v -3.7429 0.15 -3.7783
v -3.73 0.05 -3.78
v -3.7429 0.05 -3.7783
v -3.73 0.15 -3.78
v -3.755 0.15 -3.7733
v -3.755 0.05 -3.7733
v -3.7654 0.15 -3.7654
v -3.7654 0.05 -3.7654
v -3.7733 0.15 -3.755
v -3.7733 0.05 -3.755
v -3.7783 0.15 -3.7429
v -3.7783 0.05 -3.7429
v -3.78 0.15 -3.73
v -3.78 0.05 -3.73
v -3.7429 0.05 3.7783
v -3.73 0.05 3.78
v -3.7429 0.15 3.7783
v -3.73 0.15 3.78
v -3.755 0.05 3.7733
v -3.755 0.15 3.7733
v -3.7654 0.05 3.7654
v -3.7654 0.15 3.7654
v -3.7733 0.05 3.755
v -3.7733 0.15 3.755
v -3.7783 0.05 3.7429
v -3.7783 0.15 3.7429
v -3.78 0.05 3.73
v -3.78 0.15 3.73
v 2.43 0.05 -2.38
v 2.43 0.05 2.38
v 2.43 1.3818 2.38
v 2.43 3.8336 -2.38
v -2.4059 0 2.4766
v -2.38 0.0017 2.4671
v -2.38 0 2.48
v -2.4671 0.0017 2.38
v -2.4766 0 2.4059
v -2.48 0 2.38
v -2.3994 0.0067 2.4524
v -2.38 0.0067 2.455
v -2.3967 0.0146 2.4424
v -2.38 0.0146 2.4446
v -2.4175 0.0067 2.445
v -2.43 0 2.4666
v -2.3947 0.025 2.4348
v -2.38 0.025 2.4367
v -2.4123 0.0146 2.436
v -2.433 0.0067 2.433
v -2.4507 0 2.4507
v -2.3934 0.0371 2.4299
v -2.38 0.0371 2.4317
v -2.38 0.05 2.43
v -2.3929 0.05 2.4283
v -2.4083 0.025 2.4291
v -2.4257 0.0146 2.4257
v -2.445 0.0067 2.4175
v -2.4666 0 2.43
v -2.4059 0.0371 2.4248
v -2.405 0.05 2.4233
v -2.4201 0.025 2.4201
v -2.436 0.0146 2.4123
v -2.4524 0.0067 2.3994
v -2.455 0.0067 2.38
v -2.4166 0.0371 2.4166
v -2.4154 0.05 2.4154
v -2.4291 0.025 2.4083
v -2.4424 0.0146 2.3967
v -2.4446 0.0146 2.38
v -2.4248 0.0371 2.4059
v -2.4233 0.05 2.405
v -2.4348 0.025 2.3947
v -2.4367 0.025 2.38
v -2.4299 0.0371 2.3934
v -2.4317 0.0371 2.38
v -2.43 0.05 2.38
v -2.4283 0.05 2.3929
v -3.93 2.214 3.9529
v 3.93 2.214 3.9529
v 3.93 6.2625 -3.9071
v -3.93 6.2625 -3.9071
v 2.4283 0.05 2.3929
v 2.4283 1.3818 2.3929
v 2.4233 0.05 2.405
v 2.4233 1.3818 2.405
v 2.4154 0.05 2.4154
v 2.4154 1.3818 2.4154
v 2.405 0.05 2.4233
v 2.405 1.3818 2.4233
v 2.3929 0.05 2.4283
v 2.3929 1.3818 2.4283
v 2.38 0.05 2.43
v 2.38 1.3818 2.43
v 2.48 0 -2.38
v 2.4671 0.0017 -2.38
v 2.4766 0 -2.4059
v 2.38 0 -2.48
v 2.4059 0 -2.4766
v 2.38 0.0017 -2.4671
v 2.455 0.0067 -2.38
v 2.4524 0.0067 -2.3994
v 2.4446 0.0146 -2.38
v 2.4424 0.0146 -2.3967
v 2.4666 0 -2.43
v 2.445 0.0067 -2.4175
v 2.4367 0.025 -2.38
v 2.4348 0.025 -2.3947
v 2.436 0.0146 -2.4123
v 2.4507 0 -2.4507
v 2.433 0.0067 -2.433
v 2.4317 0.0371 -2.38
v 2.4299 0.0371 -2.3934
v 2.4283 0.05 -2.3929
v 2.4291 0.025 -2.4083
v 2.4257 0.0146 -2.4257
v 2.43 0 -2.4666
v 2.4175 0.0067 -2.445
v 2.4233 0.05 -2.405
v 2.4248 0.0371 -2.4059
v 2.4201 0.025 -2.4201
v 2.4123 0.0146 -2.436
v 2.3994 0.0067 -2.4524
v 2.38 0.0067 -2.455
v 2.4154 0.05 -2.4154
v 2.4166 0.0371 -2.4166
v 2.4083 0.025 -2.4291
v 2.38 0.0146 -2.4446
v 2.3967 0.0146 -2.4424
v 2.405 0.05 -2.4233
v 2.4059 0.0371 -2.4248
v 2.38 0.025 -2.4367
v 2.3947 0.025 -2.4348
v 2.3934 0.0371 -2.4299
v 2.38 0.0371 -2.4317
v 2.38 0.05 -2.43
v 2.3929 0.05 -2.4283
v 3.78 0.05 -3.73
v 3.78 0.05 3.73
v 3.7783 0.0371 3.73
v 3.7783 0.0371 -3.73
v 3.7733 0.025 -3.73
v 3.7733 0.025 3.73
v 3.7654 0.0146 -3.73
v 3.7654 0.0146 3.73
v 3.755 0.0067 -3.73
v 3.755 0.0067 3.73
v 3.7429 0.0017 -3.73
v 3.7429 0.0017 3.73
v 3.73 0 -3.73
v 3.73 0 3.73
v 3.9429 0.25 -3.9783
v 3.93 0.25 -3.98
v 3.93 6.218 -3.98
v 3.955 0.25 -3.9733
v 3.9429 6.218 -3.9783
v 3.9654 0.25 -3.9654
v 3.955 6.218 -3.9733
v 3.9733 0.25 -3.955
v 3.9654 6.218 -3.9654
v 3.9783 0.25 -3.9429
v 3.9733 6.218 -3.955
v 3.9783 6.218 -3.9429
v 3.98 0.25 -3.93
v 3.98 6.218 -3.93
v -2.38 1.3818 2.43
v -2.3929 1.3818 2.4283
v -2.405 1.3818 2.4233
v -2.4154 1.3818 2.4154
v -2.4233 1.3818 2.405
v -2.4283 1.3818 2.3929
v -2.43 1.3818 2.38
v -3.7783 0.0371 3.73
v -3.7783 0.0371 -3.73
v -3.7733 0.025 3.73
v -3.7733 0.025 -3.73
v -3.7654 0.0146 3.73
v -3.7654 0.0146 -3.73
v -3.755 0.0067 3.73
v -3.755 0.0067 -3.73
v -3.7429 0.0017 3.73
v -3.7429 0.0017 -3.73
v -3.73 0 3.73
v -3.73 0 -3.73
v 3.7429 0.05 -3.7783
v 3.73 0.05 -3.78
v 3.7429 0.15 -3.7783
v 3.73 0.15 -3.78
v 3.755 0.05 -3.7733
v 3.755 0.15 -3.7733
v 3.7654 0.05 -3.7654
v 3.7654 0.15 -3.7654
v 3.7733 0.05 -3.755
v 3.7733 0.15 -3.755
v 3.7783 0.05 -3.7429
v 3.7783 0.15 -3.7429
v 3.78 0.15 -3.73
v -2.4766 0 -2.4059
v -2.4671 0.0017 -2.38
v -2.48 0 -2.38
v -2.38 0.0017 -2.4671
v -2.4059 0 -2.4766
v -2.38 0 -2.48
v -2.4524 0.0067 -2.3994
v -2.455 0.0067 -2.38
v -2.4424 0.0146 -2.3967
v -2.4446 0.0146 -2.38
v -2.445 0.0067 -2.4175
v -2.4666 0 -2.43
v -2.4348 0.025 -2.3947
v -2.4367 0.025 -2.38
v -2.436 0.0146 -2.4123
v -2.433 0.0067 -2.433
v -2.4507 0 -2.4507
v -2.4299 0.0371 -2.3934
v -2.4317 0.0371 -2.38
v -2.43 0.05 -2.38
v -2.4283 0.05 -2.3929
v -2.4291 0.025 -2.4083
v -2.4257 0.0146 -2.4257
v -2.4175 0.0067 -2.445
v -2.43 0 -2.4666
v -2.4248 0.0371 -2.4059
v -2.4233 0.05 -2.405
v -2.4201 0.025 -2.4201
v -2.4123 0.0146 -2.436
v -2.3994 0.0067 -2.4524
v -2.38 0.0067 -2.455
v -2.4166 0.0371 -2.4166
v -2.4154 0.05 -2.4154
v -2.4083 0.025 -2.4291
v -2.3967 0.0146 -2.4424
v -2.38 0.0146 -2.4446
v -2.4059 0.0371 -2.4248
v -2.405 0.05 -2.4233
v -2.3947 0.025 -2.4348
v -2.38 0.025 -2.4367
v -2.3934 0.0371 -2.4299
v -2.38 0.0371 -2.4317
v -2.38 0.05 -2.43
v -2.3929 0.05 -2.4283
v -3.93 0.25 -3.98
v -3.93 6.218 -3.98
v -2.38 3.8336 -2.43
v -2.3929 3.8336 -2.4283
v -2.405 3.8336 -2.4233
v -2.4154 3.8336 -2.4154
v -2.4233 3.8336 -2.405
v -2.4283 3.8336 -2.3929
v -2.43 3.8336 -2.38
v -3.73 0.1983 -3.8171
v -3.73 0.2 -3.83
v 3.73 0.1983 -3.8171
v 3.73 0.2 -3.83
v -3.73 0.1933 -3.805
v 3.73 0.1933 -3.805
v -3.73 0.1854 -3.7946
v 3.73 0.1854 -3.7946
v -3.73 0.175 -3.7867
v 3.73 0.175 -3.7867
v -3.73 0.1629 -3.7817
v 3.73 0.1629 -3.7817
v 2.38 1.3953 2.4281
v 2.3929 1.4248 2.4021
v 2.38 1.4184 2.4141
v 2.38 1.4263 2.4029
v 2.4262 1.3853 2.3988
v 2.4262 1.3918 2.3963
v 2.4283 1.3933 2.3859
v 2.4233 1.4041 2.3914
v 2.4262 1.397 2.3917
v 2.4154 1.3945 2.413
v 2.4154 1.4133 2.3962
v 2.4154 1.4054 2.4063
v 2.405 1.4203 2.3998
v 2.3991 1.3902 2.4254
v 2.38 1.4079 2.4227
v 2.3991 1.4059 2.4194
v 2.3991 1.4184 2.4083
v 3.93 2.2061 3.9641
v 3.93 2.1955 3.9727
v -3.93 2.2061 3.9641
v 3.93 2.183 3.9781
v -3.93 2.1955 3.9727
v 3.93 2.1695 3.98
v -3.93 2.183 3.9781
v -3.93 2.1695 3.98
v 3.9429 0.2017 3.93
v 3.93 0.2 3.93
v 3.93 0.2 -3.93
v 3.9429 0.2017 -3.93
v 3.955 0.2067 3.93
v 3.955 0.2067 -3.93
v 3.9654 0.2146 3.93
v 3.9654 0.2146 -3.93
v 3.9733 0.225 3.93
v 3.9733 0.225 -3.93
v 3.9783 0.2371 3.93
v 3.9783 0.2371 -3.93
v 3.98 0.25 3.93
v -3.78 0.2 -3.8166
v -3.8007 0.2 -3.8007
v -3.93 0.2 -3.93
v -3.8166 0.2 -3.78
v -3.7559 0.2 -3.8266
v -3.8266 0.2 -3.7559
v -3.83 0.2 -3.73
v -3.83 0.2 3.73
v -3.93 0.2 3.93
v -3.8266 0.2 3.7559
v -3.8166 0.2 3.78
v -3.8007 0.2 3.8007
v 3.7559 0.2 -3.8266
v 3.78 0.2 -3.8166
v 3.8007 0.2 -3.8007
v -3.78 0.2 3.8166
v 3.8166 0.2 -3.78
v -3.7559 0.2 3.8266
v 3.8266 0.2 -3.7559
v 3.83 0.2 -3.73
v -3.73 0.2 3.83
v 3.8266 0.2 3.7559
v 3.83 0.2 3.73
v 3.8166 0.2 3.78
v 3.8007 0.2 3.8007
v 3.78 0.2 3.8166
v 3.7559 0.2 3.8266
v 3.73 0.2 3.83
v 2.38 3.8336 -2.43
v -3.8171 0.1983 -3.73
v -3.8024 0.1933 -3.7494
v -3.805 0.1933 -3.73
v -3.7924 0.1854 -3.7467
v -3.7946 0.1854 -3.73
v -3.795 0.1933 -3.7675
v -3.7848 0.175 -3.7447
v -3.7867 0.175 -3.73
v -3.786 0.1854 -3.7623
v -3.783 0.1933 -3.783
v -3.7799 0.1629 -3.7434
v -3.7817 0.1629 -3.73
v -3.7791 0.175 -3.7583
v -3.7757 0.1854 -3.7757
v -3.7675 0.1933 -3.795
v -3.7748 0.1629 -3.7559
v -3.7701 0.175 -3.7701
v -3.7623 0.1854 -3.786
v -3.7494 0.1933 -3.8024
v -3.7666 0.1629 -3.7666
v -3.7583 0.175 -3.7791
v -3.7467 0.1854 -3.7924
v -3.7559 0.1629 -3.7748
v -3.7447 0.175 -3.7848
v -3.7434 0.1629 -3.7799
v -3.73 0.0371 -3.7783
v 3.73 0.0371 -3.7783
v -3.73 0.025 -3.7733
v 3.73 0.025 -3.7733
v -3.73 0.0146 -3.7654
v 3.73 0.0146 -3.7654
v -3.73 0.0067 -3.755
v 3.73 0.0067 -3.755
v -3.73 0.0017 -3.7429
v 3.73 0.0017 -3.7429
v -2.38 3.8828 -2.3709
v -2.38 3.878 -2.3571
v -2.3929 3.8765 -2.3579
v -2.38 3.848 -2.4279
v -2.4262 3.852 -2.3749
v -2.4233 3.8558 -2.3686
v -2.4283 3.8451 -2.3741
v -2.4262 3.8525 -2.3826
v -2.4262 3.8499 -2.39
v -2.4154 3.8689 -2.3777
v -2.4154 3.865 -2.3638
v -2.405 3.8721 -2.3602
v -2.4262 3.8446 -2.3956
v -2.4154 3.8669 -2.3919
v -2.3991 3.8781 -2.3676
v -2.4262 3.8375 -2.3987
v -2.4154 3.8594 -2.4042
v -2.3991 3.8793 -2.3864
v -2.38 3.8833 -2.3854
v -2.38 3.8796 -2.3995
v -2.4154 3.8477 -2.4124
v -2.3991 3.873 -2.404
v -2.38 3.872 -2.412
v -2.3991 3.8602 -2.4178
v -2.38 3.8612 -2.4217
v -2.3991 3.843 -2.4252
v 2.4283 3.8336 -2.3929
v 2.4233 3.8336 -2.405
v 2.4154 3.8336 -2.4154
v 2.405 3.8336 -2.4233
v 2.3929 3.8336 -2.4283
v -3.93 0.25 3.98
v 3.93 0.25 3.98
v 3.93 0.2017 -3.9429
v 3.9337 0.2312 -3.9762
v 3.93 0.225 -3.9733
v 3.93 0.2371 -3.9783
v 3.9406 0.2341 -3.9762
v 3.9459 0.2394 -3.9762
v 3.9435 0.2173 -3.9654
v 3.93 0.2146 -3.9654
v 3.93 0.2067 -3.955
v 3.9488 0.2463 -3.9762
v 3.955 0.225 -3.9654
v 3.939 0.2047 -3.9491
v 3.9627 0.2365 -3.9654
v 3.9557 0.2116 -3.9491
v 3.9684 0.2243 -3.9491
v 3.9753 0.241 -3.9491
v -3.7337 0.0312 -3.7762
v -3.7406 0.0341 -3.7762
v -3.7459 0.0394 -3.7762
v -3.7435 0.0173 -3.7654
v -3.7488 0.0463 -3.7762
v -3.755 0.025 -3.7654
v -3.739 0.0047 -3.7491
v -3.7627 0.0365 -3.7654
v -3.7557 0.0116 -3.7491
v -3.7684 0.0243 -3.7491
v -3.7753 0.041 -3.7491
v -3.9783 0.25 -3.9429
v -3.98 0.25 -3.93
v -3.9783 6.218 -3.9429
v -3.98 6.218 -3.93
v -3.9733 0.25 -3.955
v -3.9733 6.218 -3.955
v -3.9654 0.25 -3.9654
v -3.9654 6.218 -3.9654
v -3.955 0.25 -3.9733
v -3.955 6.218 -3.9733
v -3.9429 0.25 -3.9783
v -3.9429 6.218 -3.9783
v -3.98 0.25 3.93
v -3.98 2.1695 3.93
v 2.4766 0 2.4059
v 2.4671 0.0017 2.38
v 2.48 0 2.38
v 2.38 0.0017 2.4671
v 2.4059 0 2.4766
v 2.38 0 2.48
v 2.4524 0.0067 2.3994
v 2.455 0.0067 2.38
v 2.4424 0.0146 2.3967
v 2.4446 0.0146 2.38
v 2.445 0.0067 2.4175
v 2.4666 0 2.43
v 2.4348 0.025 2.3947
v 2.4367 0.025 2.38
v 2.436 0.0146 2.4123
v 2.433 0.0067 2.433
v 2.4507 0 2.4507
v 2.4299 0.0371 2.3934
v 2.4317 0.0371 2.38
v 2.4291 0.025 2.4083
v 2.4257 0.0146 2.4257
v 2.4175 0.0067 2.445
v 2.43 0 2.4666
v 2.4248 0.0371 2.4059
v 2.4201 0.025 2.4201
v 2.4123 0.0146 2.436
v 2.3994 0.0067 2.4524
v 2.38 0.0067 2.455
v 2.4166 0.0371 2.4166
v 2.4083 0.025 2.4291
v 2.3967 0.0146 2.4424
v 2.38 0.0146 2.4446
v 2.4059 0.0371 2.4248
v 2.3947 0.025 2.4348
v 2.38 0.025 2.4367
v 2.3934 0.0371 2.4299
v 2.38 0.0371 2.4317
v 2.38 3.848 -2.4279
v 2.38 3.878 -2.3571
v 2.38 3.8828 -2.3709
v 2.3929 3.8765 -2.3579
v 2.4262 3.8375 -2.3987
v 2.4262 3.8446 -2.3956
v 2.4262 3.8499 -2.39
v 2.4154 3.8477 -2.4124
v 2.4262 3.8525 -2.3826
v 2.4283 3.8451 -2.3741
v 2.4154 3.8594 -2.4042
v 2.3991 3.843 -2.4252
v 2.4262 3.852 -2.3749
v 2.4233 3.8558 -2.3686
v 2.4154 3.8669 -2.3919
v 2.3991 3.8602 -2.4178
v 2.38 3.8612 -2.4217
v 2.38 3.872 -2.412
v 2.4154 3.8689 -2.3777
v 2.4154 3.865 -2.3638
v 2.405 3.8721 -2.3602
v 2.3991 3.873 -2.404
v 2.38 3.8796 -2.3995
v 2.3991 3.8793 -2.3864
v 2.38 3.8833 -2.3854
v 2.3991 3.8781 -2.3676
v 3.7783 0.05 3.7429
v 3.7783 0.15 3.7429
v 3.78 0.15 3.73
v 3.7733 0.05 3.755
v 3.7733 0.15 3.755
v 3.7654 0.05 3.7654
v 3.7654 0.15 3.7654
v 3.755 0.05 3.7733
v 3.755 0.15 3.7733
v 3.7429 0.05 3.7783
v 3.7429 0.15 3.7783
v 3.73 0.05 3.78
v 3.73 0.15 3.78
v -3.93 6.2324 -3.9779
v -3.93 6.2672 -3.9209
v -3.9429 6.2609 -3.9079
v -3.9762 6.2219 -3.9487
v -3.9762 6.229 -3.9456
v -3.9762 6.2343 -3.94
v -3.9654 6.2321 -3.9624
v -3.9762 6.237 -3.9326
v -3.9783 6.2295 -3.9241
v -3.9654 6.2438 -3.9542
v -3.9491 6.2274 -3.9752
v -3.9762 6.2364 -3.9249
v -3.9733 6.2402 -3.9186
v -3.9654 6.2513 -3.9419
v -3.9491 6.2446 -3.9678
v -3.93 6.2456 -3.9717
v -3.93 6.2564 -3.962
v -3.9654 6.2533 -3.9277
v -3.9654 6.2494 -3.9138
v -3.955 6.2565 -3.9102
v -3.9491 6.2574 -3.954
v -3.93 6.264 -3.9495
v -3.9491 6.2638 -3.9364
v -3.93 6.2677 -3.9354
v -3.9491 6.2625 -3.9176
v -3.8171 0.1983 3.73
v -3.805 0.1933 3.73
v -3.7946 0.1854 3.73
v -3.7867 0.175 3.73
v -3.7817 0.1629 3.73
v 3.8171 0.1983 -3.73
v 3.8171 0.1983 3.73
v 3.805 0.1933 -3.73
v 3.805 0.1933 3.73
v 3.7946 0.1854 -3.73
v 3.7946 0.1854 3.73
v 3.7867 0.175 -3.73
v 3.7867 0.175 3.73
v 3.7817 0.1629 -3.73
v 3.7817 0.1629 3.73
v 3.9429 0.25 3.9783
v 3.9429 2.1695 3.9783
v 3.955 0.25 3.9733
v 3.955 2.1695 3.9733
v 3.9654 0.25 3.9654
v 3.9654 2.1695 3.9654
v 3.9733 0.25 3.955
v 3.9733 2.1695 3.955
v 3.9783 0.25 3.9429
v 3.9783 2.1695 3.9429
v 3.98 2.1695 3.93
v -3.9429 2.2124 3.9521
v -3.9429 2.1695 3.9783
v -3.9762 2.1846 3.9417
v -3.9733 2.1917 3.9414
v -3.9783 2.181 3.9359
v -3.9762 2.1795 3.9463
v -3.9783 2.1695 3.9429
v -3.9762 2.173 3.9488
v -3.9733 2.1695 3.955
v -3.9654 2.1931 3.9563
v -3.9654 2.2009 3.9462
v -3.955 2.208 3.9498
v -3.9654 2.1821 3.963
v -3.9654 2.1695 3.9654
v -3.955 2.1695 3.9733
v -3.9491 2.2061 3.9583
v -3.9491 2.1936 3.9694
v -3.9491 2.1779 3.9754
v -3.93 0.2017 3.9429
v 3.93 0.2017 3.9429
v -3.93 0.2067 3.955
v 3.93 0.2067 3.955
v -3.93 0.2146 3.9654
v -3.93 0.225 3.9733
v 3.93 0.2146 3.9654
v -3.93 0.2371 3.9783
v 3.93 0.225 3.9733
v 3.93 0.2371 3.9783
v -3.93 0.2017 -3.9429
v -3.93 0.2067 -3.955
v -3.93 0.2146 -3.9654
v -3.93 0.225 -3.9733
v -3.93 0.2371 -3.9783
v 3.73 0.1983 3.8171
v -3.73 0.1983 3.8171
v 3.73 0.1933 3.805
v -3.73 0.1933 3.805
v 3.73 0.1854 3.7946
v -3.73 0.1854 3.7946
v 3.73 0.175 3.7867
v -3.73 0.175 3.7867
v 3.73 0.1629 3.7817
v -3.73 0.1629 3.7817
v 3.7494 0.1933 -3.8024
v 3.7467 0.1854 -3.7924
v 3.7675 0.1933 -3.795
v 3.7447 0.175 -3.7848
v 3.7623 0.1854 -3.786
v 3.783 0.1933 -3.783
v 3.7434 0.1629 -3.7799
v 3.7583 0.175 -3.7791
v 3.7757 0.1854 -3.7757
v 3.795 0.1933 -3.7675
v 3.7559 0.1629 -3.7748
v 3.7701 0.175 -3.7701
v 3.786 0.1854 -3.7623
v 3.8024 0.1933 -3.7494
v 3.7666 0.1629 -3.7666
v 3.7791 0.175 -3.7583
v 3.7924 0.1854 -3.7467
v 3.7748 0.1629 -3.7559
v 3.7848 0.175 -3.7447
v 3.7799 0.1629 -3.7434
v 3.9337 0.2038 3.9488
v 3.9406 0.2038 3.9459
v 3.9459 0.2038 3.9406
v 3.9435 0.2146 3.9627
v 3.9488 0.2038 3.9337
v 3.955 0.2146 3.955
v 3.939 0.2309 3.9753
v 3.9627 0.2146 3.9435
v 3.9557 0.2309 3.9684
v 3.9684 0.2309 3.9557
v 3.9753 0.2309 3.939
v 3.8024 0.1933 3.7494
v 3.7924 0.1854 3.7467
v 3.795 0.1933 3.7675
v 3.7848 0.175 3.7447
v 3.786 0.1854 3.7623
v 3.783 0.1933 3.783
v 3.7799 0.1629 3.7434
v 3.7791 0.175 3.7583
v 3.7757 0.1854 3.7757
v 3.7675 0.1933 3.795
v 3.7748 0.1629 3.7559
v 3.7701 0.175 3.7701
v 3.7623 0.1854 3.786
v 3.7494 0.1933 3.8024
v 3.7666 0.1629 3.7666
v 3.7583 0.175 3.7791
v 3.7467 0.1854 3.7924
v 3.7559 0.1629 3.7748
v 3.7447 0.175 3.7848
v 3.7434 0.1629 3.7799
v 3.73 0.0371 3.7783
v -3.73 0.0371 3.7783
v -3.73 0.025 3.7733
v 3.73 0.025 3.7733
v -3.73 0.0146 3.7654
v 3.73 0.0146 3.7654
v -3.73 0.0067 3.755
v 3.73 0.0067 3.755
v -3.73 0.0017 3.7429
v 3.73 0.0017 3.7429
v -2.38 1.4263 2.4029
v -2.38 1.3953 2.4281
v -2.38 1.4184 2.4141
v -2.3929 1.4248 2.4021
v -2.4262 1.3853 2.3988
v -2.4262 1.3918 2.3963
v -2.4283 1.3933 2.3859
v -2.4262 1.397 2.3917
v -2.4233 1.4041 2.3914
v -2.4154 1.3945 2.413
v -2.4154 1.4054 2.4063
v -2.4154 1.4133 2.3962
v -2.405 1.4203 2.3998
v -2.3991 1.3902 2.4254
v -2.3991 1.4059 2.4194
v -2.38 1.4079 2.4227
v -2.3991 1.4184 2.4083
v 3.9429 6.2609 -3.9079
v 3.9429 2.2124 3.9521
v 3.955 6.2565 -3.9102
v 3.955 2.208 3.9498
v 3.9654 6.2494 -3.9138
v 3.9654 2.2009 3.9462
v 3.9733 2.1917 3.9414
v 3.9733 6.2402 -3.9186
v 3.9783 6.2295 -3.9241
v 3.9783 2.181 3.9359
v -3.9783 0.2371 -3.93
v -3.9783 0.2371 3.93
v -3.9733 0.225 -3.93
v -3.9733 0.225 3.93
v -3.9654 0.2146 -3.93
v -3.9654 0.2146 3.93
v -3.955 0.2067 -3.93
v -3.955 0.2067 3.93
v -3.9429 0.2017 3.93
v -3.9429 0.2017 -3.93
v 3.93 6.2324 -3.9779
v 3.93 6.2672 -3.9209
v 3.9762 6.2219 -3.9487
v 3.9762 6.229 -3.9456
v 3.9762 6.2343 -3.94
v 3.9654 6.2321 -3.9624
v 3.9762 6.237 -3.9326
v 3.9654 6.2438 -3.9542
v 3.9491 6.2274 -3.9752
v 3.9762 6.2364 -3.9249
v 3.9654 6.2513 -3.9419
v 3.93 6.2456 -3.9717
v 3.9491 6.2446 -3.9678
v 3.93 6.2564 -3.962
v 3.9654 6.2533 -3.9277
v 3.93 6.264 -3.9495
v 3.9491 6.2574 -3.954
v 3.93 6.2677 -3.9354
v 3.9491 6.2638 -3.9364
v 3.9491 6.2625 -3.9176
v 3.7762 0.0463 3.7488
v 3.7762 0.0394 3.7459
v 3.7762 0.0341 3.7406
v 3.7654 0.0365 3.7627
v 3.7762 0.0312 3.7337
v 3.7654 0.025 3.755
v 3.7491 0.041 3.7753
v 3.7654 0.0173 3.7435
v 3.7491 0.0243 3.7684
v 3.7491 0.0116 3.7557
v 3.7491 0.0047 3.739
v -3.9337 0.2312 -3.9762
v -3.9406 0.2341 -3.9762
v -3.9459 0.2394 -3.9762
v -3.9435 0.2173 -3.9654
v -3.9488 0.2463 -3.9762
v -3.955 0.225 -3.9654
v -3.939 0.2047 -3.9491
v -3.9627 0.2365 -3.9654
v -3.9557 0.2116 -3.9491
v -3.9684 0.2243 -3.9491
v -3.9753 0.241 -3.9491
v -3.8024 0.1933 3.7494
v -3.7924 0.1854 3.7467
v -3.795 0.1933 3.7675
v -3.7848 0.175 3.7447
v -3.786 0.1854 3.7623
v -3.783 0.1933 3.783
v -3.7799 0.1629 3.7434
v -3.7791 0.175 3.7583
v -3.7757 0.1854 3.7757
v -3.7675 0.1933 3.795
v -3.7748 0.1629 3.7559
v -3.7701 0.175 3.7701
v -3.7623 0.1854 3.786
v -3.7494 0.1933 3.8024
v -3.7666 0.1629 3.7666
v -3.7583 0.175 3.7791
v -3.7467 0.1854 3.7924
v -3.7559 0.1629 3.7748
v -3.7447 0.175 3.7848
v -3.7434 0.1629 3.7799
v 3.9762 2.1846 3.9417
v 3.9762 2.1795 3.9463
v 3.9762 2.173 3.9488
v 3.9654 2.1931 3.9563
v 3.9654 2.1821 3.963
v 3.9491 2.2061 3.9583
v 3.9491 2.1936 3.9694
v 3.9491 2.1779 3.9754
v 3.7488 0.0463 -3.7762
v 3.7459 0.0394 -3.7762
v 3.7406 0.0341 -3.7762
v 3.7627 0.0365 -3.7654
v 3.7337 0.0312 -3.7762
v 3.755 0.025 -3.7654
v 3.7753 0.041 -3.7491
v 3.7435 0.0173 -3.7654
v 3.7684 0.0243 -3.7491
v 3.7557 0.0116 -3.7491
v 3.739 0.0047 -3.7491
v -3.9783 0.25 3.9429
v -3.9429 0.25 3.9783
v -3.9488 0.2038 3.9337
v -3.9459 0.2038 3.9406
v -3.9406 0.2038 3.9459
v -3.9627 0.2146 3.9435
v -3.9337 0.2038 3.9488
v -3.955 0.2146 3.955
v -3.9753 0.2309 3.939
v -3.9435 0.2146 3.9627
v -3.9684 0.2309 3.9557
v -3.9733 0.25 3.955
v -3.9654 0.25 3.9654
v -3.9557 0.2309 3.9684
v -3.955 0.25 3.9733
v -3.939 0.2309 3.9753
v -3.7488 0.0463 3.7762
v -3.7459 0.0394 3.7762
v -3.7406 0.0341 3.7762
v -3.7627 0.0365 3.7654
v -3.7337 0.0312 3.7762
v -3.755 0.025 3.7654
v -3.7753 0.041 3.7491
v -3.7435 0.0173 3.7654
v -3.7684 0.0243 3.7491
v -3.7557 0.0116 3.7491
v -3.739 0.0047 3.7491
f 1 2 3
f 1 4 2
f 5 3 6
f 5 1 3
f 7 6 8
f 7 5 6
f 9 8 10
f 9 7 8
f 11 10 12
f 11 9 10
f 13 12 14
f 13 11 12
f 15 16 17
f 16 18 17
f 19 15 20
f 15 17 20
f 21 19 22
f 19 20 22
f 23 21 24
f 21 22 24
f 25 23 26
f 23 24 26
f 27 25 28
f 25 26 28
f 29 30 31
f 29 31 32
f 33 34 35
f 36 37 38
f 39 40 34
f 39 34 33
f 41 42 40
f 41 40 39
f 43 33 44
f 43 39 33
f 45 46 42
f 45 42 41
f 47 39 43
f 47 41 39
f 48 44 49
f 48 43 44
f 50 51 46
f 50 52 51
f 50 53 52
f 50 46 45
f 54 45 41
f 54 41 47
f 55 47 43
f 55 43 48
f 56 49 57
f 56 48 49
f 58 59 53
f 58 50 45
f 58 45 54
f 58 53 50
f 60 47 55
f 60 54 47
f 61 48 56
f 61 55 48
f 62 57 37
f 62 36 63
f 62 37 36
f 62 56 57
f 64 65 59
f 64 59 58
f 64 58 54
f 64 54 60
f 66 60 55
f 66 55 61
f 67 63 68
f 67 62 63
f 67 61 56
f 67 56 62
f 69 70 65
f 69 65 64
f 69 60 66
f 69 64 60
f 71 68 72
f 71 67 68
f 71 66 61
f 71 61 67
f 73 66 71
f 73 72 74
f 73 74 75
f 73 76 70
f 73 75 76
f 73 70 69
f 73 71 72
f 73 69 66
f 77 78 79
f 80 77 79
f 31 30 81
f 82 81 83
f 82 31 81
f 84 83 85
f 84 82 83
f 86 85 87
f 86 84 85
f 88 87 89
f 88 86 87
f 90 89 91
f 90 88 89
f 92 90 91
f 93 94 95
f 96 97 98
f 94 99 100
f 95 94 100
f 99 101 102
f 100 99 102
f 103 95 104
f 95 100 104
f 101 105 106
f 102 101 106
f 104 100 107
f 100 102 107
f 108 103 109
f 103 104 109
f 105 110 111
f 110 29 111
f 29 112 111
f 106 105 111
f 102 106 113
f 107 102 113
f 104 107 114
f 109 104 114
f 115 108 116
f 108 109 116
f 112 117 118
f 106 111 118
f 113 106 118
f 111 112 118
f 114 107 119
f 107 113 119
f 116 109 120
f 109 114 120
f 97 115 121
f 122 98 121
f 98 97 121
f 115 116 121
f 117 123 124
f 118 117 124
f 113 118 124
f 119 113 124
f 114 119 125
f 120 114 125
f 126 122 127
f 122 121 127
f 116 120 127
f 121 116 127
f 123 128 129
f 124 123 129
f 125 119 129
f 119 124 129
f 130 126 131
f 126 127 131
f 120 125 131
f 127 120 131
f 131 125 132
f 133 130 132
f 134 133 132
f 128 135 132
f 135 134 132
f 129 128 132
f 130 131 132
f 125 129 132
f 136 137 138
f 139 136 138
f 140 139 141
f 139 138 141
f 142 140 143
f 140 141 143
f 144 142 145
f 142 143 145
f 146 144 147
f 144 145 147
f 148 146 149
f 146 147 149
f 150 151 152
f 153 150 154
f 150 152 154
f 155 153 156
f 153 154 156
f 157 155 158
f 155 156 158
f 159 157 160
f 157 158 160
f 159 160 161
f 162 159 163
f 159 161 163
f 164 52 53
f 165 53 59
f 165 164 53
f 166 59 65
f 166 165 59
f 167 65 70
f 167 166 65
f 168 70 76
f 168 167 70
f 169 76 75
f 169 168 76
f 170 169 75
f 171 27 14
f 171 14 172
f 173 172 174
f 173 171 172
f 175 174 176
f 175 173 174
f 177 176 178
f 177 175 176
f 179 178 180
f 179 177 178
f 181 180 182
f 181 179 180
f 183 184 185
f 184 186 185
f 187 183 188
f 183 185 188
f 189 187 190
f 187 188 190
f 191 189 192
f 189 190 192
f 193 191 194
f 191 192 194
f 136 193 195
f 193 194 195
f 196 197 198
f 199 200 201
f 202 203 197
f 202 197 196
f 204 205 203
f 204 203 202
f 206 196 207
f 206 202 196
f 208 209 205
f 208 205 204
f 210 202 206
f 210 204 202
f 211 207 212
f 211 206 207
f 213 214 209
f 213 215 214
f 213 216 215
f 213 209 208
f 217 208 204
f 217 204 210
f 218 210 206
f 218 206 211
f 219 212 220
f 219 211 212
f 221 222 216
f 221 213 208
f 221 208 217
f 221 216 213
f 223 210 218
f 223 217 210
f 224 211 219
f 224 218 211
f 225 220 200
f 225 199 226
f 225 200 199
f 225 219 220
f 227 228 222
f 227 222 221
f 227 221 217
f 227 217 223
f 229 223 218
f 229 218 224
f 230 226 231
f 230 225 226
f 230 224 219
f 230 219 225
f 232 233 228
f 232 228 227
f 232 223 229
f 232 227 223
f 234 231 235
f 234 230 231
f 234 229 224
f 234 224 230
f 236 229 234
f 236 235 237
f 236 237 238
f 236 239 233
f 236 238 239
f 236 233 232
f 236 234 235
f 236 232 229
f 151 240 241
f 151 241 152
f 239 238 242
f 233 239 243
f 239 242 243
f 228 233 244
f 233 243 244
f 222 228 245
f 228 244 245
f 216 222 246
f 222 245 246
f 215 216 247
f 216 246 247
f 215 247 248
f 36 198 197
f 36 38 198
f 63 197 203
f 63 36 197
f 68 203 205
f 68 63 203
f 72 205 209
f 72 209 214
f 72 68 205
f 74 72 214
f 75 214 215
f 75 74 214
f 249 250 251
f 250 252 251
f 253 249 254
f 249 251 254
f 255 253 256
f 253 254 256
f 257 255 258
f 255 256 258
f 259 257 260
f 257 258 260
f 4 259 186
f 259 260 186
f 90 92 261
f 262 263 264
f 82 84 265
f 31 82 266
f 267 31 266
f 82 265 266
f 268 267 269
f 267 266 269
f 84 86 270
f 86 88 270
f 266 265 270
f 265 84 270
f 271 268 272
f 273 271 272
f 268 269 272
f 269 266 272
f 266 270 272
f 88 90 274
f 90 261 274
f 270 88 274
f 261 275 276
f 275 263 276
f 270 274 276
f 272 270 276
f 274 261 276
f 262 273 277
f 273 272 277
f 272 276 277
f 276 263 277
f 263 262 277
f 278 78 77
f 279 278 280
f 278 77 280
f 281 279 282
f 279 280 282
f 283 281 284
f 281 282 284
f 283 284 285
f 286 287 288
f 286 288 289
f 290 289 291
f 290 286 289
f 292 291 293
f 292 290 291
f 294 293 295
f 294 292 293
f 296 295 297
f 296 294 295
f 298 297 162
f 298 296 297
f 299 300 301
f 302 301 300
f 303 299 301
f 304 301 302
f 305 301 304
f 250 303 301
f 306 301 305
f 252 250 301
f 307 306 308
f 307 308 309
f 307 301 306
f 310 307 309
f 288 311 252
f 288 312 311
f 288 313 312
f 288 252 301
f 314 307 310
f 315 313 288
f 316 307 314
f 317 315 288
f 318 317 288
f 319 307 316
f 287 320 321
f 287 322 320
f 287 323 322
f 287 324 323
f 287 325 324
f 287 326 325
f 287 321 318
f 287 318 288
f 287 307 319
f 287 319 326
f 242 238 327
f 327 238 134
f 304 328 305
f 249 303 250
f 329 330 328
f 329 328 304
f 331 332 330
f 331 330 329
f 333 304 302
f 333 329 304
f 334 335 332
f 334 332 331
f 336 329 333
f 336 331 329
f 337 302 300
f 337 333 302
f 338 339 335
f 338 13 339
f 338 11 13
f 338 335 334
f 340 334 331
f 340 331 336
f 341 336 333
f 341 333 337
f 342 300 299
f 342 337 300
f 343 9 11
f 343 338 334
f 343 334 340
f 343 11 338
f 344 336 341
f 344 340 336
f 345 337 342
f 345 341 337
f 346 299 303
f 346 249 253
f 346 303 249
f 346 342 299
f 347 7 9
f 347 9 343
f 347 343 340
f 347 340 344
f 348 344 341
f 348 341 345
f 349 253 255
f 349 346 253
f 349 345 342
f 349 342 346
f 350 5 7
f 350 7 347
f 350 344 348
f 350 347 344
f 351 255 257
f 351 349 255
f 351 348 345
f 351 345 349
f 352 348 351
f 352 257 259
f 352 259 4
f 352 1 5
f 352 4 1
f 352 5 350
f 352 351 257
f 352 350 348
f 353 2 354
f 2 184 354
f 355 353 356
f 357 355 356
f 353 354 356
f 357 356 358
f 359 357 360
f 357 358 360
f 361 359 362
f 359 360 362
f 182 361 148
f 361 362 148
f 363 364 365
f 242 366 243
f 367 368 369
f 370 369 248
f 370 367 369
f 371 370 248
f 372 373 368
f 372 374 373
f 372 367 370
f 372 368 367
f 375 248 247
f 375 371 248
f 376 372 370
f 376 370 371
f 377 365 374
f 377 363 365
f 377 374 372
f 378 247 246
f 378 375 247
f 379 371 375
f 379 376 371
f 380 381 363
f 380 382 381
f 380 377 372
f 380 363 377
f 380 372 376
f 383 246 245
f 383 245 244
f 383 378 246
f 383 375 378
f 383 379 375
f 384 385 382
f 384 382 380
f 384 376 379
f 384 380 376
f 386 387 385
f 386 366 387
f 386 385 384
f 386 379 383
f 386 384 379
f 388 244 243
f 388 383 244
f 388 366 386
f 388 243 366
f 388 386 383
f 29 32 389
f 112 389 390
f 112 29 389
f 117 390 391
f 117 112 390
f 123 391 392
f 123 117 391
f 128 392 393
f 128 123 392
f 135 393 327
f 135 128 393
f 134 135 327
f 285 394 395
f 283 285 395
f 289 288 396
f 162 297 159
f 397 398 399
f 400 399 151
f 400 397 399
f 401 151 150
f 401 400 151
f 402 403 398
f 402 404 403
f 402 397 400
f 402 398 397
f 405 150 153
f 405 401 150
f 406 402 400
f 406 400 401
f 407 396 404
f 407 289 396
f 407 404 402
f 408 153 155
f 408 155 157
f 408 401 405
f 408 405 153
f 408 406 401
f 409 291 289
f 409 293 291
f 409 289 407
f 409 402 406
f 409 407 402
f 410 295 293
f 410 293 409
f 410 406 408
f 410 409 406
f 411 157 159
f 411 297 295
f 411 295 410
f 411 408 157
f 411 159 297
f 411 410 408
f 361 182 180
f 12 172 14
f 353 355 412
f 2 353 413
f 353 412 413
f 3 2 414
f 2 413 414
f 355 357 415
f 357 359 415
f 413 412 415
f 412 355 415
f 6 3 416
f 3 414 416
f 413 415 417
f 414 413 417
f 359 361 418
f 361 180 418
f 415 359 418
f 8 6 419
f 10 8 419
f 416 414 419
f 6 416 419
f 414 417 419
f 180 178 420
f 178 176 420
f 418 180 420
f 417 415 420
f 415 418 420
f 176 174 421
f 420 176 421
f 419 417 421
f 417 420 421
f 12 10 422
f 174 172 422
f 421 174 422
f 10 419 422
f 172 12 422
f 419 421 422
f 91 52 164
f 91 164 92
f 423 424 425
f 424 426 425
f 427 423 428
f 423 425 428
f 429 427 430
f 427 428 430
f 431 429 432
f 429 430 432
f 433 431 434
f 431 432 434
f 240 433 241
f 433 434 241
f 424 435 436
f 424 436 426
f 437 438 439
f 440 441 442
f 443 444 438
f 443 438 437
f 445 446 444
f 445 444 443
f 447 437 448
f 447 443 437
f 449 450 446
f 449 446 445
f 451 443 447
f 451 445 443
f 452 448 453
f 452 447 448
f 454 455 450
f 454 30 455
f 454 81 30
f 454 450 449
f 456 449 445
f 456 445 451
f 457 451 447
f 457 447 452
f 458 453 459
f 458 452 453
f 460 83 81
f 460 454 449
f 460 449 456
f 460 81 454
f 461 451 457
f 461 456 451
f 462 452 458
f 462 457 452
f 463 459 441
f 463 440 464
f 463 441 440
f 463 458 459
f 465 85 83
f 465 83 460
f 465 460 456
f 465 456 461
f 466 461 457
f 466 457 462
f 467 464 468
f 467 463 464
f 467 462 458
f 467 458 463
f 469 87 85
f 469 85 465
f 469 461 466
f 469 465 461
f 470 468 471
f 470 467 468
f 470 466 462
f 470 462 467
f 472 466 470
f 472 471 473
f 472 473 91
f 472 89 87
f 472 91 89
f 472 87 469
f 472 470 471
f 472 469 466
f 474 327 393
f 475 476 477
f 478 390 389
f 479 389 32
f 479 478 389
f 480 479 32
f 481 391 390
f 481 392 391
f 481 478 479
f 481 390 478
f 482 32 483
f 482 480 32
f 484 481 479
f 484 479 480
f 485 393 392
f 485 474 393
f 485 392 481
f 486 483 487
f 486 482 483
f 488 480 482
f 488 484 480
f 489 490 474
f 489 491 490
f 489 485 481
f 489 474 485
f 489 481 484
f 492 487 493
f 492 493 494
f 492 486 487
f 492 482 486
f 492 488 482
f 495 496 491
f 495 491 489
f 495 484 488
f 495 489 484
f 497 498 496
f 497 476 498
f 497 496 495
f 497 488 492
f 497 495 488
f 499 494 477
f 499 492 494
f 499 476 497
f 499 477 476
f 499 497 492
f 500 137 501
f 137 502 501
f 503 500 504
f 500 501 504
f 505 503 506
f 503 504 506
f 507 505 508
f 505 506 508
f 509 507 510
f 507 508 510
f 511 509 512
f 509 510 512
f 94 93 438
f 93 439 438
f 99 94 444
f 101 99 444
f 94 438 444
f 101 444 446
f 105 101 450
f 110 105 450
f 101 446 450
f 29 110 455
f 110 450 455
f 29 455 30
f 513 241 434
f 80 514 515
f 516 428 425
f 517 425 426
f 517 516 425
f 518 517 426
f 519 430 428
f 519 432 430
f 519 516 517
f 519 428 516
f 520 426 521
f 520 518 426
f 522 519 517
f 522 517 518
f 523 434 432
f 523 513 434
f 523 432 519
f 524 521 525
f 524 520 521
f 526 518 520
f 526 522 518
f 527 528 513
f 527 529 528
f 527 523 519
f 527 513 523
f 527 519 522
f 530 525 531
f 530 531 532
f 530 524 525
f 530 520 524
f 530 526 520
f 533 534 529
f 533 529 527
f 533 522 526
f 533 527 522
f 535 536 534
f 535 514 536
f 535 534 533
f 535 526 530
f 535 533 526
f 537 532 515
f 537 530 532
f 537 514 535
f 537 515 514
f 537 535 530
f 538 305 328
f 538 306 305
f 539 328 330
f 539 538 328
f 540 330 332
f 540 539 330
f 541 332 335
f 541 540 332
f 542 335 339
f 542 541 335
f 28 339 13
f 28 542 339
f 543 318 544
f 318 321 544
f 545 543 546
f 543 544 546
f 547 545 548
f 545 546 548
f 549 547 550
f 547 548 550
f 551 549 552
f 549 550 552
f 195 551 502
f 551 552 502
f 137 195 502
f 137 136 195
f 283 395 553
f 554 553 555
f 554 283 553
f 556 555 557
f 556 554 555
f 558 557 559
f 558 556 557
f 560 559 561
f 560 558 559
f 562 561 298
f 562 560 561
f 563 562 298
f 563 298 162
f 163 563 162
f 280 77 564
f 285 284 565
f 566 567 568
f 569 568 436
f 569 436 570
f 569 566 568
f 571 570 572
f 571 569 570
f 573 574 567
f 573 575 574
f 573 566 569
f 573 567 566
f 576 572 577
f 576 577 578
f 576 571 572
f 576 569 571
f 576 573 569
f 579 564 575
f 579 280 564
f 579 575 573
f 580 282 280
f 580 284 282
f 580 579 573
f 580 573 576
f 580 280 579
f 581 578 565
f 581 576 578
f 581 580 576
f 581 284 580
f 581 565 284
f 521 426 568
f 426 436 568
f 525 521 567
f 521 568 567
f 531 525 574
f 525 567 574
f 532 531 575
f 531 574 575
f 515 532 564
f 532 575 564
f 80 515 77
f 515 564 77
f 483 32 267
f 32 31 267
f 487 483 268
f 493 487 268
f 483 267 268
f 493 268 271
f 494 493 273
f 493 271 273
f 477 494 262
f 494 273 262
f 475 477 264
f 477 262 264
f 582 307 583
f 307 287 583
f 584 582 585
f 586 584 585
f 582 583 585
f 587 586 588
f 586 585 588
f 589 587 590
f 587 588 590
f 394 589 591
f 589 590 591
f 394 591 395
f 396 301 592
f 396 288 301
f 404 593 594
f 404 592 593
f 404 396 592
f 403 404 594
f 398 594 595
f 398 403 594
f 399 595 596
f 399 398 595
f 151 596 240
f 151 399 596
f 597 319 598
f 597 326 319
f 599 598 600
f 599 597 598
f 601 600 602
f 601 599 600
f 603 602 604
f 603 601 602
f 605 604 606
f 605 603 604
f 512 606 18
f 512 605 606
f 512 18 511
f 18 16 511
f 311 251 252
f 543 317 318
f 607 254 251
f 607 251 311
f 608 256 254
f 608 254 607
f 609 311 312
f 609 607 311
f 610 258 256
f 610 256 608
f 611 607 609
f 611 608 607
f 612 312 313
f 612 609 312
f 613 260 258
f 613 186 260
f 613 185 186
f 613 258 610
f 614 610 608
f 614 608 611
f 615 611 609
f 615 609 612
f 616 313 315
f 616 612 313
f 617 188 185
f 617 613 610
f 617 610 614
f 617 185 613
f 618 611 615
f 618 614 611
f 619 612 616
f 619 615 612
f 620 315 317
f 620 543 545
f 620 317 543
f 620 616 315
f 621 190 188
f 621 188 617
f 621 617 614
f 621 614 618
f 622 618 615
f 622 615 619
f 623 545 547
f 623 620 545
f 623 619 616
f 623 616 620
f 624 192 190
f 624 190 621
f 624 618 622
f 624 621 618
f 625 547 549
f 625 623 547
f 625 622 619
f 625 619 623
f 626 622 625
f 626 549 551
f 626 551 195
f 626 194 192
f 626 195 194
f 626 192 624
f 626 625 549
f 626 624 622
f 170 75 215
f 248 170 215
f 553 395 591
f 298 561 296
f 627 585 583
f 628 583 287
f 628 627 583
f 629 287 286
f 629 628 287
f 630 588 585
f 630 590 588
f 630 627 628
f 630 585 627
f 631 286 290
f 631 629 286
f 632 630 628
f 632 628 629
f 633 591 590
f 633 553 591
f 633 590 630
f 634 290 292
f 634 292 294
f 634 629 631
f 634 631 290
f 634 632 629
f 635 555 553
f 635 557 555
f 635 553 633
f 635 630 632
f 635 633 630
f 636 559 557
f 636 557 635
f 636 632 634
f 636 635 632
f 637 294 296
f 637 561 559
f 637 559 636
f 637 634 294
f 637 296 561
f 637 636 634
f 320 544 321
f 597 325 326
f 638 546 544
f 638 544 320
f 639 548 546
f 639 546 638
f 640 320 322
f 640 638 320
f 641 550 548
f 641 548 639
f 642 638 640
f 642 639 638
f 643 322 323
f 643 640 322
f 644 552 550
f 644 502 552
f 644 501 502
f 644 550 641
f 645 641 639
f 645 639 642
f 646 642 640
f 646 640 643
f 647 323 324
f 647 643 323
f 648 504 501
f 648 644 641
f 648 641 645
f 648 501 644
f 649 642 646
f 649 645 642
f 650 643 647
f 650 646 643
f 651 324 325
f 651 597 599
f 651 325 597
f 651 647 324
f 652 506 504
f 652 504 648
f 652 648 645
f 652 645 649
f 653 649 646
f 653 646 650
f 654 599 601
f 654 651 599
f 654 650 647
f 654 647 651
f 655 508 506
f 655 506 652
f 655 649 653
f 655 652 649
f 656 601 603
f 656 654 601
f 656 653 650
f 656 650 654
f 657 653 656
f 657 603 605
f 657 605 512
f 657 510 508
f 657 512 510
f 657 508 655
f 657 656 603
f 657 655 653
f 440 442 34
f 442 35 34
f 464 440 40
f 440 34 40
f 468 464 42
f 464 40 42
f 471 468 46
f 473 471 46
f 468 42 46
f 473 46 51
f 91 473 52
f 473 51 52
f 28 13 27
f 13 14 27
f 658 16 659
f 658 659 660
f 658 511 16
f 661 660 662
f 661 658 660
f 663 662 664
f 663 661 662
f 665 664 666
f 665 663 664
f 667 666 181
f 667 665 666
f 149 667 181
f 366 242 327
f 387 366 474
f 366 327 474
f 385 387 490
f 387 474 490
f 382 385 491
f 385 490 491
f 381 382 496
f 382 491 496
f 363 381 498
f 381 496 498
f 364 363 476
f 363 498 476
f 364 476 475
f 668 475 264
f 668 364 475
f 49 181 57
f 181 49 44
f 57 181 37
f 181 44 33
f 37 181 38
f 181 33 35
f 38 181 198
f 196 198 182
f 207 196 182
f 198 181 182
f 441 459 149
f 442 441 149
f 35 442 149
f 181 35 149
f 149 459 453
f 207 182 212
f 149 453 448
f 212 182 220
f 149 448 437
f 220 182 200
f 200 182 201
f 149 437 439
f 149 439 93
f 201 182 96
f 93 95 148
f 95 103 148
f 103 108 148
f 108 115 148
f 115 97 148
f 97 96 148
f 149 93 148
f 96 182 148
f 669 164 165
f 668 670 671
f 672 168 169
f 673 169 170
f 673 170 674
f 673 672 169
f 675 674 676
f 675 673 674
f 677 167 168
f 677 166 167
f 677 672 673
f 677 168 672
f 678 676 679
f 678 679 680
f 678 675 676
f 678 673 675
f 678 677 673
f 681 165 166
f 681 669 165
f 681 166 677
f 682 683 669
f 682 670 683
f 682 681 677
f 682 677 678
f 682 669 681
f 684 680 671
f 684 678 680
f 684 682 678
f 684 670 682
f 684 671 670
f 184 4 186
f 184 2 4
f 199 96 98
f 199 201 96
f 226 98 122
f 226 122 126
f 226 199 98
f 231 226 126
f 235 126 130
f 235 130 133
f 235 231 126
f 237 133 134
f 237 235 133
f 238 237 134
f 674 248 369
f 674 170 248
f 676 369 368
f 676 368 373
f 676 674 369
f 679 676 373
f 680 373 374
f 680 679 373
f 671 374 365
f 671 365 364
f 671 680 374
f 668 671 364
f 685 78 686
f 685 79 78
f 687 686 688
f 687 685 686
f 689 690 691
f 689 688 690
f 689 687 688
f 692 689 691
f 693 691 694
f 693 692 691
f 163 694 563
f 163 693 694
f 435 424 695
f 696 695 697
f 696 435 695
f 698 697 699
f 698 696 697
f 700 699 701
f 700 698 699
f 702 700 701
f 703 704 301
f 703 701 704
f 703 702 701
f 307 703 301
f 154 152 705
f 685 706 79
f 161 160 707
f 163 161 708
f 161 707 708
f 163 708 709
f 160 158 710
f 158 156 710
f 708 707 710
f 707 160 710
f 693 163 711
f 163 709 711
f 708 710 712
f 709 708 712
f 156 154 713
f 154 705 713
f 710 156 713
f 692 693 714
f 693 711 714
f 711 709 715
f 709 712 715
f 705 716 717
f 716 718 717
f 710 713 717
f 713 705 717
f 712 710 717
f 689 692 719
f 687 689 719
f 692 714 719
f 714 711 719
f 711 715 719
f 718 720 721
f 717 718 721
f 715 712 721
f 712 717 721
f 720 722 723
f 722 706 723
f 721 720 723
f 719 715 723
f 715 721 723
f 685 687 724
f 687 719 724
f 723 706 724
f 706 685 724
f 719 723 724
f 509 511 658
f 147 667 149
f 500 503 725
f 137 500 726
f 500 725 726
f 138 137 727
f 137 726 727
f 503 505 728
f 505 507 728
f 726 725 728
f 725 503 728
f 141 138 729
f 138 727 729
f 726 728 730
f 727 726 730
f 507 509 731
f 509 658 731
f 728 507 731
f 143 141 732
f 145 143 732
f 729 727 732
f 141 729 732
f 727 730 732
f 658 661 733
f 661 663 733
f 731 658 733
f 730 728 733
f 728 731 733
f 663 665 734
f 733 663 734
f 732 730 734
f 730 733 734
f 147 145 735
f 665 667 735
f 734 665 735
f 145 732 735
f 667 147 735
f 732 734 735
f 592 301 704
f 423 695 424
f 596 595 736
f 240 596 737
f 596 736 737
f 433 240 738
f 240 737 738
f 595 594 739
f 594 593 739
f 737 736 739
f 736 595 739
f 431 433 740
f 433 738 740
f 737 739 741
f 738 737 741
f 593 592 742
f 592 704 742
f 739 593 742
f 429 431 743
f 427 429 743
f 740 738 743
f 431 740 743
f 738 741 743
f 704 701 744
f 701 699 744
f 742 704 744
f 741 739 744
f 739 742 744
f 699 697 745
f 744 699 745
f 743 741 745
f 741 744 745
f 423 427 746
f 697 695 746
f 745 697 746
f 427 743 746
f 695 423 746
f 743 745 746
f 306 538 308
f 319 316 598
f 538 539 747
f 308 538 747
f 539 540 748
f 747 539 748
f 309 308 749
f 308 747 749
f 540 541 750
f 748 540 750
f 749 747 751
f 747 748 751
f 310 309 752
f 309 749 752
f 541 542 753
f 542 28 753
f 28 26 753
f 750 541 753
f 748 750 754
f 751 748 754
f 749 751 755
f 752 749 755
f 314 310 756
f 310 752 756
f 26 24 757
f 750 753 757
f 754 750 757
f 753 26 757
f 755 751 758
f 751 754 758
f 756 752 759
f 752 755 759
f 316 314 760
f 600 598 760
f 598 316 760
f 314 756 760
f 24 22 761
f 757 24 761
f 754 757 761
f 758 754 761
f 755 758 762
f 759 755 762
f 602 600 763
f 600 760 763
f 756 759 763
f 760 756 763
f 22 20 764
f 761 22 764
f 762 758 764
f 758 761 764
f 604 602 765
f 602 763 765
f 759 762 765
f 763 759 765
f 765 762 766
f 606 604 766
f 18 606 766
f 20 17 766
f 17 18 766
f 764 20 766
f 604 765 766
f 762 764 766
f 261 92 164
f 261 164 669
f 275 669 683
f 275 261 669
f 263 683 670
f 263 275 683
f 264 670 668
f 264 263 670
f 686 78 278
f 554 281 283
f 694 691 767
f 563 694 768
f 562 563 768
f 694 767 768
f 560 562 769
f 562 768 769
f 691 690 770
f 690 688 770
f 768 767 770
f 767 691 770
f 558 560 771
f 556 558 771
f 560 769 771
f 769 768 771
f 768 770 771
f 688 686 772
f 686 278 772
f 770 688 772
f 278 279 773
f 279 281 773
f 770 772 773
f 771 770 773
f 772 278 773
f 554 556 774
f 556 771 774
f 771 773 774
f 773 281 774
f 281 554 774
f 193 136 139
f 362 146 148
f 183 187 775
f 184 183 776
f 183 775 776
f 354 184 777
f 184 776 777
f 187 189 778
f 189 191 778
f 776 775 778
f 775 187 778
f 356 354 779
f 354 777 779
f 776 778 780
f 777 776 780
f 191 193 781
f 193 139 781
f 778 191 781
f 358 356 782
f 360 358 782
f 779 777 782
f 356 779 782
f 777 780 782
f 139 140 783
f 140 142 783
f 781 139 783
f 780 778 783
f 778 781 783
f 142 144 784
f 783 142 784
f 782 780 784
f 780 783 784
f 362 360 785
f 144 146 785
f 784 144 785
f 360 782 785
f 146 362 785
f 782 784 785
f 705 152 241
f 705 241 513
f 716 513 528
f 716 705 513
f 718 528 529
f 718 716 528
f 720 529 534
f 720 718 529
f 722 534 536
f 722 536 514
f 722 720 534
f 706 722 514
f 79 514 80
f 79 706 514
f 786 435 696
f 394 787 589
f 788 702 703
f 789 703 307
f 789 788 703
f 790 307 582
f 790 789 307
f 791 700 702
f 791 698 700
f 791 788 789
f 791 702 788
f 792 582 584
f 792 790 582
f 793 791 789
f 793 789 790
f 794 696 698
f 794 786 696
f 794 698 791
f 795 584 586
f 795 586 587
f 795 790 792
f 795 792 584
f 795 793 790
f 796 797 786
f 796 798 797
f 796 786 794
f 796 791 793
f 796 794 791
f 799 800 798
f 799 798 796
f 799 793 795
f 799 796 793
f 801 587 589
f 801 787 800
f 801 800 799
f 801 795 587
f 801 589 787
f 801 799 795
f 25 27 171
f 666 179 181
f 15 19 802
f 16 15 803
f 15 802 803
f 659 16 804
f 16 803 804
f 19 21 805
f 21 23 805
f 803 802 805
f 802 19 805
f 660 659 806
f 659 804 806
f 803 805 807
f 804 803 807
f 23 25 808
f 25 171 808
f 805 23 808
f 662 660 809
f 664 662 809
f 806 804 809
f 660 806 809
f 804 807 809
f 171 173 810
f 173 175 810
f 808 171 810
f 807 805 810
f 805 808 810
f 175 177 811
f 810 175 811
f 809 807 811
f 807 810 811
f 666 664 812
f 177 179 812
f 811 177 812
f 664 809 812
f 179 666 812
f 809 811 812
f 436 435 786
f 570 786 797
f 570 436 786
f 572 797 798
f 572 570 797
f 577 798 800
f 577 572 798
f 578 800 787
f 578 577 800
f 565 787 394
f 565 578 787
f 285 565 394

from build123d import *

# Parameters (mm, degrees)
SKETCH1_W      = 7.96
SKETCH1_H      = 7.96
EXTRUDE1_DEPTH = 6.3
EXTRUDE2_DEPTH = 8.96
SHELL1_T       = -1.55
EXTRUDE4_DEPTH = 4.86
SKETCH6_W      = 7.96
SKETCH6_H      = 7.96
SKETCH6_W_2    = 7.56
SKETCH6_H_2    = 7.56
EXTRUDE5_DEPTH = 0.2
FILLET1_R      = 0.05


with BuildPart() as part:
    # Sketch1 → Extrude1 (new body)
    with BuildSketch(Plane(origin=(0, 0, 0), x_dir=(1, 0, 0), z_dir=(0, 1, 0))):
        Rectangle(SKETCH1_W, SKETCH1_H)
    extrude(amount=EXTRUDE1_DEPTH)

    # Sketch2 → Extrude2 (cut, through all)
    with BuildSketch(Plane(origin=(3.98, 0, 0), x_dir=(0, 0, -1), z_dir=(1, 0, 0))):
        Polygon((-3.98, 2.2), (3.98, 6.3), (-3.98, 6.3), align=None)
    extrude(amount=-EXTRUDE2_DEPTH, mode=Mode.SUBTRACT)

    # Shell1
    shell1_openings = [part.faces().sort_by_distance(p)[0] for p in [
        (0, 0, 0),
    ]]
    offset(amount=SHELL1_T, openings=shell1_openings, kind=Kind.INTERSECTION)

    # Sketch5 → Extrude4 (cut)
    with BuildSketch(Plane(origin=(-2.43, 0, 0), x_dir=(0, 0, -1), z_dir=(1, 0, 0))):
        Polygon((-2.43, 0), (2.43, 0), (2.43, 3.915585189), (-2.43, 1.412318857), align=None)
    extrude(amount=EXTRUDE4_DEPTH, mode=Mode.SUBTRACT)

    # Sketch6 → Extrude5 (cut)
    with BuildSketch(Plane.XZ):
        Rectangle(SKETCH6_W, SKETCH6_H)
        Rectangle(SKETCH6_W_2, SKETCH6_H_2, mode=Mode.SUBTRACT)
    extrude(amount=-EXTRUDE5_DEPTH, mode=Mode.SUBTRACT)

    # Fillet1
    fillet1_edges = [part.edges().sort_by_distance(p)[0] for p in [
        (3.98, 1.2, 3.98),
        (-3.98, 1.2, 3.98),
        (0, 2.2, 3.98),
        (-3.98, 4.25, 0),
        (3.98, 4.25, 0),
        (2.43, 0.706159428, 2.43),
        (2.43, 0, 0),
        (0, 0, -2.43),
        (2.43, 1.957792594, -2.43),
        (-2.43, 1.957792594, -2.43),
        (-2.43, 0, 0),
        (-2.43, 0.706159428, 2.43),
        (0, 0, 2.43),
        (2.43, 2.663952023, 0),
        (0, 3.915585189, -2.43),
        (-2.43, 2.663952023, 0),
        (0, 1.412318857, 2.43),
        (-3.98, 0.2, 0),
        (0, 0.2, 3.98),
        (3.98, 0.2, 0),
        (0, 0.2, -3.98),
        (-3.78, 0.2, 0),
        (0, 0.2, -3.78),
        (3.78, 0.2, 0),
        (0, 0.2, 3.78),
        (-3.78, 0, 0),
        (-3.78, 0.1, 3.78),
        (0, 0, 3.78),
        (3.78, 0.1, 3.78),
        (3.78, 0, 0),
        (3.78, 0.1, -3.78),
        (0, 0, -3.78),
        (-3.78, 0.1, -3.78),
        (0, 6.3, -3.98),
        (-3.98, 3.25, -3.98),
        (3.98, 3.25, -3.98),
    ]]
    fillet(fillet1_edges, radius=FILLET1_R)


solid = part.part
